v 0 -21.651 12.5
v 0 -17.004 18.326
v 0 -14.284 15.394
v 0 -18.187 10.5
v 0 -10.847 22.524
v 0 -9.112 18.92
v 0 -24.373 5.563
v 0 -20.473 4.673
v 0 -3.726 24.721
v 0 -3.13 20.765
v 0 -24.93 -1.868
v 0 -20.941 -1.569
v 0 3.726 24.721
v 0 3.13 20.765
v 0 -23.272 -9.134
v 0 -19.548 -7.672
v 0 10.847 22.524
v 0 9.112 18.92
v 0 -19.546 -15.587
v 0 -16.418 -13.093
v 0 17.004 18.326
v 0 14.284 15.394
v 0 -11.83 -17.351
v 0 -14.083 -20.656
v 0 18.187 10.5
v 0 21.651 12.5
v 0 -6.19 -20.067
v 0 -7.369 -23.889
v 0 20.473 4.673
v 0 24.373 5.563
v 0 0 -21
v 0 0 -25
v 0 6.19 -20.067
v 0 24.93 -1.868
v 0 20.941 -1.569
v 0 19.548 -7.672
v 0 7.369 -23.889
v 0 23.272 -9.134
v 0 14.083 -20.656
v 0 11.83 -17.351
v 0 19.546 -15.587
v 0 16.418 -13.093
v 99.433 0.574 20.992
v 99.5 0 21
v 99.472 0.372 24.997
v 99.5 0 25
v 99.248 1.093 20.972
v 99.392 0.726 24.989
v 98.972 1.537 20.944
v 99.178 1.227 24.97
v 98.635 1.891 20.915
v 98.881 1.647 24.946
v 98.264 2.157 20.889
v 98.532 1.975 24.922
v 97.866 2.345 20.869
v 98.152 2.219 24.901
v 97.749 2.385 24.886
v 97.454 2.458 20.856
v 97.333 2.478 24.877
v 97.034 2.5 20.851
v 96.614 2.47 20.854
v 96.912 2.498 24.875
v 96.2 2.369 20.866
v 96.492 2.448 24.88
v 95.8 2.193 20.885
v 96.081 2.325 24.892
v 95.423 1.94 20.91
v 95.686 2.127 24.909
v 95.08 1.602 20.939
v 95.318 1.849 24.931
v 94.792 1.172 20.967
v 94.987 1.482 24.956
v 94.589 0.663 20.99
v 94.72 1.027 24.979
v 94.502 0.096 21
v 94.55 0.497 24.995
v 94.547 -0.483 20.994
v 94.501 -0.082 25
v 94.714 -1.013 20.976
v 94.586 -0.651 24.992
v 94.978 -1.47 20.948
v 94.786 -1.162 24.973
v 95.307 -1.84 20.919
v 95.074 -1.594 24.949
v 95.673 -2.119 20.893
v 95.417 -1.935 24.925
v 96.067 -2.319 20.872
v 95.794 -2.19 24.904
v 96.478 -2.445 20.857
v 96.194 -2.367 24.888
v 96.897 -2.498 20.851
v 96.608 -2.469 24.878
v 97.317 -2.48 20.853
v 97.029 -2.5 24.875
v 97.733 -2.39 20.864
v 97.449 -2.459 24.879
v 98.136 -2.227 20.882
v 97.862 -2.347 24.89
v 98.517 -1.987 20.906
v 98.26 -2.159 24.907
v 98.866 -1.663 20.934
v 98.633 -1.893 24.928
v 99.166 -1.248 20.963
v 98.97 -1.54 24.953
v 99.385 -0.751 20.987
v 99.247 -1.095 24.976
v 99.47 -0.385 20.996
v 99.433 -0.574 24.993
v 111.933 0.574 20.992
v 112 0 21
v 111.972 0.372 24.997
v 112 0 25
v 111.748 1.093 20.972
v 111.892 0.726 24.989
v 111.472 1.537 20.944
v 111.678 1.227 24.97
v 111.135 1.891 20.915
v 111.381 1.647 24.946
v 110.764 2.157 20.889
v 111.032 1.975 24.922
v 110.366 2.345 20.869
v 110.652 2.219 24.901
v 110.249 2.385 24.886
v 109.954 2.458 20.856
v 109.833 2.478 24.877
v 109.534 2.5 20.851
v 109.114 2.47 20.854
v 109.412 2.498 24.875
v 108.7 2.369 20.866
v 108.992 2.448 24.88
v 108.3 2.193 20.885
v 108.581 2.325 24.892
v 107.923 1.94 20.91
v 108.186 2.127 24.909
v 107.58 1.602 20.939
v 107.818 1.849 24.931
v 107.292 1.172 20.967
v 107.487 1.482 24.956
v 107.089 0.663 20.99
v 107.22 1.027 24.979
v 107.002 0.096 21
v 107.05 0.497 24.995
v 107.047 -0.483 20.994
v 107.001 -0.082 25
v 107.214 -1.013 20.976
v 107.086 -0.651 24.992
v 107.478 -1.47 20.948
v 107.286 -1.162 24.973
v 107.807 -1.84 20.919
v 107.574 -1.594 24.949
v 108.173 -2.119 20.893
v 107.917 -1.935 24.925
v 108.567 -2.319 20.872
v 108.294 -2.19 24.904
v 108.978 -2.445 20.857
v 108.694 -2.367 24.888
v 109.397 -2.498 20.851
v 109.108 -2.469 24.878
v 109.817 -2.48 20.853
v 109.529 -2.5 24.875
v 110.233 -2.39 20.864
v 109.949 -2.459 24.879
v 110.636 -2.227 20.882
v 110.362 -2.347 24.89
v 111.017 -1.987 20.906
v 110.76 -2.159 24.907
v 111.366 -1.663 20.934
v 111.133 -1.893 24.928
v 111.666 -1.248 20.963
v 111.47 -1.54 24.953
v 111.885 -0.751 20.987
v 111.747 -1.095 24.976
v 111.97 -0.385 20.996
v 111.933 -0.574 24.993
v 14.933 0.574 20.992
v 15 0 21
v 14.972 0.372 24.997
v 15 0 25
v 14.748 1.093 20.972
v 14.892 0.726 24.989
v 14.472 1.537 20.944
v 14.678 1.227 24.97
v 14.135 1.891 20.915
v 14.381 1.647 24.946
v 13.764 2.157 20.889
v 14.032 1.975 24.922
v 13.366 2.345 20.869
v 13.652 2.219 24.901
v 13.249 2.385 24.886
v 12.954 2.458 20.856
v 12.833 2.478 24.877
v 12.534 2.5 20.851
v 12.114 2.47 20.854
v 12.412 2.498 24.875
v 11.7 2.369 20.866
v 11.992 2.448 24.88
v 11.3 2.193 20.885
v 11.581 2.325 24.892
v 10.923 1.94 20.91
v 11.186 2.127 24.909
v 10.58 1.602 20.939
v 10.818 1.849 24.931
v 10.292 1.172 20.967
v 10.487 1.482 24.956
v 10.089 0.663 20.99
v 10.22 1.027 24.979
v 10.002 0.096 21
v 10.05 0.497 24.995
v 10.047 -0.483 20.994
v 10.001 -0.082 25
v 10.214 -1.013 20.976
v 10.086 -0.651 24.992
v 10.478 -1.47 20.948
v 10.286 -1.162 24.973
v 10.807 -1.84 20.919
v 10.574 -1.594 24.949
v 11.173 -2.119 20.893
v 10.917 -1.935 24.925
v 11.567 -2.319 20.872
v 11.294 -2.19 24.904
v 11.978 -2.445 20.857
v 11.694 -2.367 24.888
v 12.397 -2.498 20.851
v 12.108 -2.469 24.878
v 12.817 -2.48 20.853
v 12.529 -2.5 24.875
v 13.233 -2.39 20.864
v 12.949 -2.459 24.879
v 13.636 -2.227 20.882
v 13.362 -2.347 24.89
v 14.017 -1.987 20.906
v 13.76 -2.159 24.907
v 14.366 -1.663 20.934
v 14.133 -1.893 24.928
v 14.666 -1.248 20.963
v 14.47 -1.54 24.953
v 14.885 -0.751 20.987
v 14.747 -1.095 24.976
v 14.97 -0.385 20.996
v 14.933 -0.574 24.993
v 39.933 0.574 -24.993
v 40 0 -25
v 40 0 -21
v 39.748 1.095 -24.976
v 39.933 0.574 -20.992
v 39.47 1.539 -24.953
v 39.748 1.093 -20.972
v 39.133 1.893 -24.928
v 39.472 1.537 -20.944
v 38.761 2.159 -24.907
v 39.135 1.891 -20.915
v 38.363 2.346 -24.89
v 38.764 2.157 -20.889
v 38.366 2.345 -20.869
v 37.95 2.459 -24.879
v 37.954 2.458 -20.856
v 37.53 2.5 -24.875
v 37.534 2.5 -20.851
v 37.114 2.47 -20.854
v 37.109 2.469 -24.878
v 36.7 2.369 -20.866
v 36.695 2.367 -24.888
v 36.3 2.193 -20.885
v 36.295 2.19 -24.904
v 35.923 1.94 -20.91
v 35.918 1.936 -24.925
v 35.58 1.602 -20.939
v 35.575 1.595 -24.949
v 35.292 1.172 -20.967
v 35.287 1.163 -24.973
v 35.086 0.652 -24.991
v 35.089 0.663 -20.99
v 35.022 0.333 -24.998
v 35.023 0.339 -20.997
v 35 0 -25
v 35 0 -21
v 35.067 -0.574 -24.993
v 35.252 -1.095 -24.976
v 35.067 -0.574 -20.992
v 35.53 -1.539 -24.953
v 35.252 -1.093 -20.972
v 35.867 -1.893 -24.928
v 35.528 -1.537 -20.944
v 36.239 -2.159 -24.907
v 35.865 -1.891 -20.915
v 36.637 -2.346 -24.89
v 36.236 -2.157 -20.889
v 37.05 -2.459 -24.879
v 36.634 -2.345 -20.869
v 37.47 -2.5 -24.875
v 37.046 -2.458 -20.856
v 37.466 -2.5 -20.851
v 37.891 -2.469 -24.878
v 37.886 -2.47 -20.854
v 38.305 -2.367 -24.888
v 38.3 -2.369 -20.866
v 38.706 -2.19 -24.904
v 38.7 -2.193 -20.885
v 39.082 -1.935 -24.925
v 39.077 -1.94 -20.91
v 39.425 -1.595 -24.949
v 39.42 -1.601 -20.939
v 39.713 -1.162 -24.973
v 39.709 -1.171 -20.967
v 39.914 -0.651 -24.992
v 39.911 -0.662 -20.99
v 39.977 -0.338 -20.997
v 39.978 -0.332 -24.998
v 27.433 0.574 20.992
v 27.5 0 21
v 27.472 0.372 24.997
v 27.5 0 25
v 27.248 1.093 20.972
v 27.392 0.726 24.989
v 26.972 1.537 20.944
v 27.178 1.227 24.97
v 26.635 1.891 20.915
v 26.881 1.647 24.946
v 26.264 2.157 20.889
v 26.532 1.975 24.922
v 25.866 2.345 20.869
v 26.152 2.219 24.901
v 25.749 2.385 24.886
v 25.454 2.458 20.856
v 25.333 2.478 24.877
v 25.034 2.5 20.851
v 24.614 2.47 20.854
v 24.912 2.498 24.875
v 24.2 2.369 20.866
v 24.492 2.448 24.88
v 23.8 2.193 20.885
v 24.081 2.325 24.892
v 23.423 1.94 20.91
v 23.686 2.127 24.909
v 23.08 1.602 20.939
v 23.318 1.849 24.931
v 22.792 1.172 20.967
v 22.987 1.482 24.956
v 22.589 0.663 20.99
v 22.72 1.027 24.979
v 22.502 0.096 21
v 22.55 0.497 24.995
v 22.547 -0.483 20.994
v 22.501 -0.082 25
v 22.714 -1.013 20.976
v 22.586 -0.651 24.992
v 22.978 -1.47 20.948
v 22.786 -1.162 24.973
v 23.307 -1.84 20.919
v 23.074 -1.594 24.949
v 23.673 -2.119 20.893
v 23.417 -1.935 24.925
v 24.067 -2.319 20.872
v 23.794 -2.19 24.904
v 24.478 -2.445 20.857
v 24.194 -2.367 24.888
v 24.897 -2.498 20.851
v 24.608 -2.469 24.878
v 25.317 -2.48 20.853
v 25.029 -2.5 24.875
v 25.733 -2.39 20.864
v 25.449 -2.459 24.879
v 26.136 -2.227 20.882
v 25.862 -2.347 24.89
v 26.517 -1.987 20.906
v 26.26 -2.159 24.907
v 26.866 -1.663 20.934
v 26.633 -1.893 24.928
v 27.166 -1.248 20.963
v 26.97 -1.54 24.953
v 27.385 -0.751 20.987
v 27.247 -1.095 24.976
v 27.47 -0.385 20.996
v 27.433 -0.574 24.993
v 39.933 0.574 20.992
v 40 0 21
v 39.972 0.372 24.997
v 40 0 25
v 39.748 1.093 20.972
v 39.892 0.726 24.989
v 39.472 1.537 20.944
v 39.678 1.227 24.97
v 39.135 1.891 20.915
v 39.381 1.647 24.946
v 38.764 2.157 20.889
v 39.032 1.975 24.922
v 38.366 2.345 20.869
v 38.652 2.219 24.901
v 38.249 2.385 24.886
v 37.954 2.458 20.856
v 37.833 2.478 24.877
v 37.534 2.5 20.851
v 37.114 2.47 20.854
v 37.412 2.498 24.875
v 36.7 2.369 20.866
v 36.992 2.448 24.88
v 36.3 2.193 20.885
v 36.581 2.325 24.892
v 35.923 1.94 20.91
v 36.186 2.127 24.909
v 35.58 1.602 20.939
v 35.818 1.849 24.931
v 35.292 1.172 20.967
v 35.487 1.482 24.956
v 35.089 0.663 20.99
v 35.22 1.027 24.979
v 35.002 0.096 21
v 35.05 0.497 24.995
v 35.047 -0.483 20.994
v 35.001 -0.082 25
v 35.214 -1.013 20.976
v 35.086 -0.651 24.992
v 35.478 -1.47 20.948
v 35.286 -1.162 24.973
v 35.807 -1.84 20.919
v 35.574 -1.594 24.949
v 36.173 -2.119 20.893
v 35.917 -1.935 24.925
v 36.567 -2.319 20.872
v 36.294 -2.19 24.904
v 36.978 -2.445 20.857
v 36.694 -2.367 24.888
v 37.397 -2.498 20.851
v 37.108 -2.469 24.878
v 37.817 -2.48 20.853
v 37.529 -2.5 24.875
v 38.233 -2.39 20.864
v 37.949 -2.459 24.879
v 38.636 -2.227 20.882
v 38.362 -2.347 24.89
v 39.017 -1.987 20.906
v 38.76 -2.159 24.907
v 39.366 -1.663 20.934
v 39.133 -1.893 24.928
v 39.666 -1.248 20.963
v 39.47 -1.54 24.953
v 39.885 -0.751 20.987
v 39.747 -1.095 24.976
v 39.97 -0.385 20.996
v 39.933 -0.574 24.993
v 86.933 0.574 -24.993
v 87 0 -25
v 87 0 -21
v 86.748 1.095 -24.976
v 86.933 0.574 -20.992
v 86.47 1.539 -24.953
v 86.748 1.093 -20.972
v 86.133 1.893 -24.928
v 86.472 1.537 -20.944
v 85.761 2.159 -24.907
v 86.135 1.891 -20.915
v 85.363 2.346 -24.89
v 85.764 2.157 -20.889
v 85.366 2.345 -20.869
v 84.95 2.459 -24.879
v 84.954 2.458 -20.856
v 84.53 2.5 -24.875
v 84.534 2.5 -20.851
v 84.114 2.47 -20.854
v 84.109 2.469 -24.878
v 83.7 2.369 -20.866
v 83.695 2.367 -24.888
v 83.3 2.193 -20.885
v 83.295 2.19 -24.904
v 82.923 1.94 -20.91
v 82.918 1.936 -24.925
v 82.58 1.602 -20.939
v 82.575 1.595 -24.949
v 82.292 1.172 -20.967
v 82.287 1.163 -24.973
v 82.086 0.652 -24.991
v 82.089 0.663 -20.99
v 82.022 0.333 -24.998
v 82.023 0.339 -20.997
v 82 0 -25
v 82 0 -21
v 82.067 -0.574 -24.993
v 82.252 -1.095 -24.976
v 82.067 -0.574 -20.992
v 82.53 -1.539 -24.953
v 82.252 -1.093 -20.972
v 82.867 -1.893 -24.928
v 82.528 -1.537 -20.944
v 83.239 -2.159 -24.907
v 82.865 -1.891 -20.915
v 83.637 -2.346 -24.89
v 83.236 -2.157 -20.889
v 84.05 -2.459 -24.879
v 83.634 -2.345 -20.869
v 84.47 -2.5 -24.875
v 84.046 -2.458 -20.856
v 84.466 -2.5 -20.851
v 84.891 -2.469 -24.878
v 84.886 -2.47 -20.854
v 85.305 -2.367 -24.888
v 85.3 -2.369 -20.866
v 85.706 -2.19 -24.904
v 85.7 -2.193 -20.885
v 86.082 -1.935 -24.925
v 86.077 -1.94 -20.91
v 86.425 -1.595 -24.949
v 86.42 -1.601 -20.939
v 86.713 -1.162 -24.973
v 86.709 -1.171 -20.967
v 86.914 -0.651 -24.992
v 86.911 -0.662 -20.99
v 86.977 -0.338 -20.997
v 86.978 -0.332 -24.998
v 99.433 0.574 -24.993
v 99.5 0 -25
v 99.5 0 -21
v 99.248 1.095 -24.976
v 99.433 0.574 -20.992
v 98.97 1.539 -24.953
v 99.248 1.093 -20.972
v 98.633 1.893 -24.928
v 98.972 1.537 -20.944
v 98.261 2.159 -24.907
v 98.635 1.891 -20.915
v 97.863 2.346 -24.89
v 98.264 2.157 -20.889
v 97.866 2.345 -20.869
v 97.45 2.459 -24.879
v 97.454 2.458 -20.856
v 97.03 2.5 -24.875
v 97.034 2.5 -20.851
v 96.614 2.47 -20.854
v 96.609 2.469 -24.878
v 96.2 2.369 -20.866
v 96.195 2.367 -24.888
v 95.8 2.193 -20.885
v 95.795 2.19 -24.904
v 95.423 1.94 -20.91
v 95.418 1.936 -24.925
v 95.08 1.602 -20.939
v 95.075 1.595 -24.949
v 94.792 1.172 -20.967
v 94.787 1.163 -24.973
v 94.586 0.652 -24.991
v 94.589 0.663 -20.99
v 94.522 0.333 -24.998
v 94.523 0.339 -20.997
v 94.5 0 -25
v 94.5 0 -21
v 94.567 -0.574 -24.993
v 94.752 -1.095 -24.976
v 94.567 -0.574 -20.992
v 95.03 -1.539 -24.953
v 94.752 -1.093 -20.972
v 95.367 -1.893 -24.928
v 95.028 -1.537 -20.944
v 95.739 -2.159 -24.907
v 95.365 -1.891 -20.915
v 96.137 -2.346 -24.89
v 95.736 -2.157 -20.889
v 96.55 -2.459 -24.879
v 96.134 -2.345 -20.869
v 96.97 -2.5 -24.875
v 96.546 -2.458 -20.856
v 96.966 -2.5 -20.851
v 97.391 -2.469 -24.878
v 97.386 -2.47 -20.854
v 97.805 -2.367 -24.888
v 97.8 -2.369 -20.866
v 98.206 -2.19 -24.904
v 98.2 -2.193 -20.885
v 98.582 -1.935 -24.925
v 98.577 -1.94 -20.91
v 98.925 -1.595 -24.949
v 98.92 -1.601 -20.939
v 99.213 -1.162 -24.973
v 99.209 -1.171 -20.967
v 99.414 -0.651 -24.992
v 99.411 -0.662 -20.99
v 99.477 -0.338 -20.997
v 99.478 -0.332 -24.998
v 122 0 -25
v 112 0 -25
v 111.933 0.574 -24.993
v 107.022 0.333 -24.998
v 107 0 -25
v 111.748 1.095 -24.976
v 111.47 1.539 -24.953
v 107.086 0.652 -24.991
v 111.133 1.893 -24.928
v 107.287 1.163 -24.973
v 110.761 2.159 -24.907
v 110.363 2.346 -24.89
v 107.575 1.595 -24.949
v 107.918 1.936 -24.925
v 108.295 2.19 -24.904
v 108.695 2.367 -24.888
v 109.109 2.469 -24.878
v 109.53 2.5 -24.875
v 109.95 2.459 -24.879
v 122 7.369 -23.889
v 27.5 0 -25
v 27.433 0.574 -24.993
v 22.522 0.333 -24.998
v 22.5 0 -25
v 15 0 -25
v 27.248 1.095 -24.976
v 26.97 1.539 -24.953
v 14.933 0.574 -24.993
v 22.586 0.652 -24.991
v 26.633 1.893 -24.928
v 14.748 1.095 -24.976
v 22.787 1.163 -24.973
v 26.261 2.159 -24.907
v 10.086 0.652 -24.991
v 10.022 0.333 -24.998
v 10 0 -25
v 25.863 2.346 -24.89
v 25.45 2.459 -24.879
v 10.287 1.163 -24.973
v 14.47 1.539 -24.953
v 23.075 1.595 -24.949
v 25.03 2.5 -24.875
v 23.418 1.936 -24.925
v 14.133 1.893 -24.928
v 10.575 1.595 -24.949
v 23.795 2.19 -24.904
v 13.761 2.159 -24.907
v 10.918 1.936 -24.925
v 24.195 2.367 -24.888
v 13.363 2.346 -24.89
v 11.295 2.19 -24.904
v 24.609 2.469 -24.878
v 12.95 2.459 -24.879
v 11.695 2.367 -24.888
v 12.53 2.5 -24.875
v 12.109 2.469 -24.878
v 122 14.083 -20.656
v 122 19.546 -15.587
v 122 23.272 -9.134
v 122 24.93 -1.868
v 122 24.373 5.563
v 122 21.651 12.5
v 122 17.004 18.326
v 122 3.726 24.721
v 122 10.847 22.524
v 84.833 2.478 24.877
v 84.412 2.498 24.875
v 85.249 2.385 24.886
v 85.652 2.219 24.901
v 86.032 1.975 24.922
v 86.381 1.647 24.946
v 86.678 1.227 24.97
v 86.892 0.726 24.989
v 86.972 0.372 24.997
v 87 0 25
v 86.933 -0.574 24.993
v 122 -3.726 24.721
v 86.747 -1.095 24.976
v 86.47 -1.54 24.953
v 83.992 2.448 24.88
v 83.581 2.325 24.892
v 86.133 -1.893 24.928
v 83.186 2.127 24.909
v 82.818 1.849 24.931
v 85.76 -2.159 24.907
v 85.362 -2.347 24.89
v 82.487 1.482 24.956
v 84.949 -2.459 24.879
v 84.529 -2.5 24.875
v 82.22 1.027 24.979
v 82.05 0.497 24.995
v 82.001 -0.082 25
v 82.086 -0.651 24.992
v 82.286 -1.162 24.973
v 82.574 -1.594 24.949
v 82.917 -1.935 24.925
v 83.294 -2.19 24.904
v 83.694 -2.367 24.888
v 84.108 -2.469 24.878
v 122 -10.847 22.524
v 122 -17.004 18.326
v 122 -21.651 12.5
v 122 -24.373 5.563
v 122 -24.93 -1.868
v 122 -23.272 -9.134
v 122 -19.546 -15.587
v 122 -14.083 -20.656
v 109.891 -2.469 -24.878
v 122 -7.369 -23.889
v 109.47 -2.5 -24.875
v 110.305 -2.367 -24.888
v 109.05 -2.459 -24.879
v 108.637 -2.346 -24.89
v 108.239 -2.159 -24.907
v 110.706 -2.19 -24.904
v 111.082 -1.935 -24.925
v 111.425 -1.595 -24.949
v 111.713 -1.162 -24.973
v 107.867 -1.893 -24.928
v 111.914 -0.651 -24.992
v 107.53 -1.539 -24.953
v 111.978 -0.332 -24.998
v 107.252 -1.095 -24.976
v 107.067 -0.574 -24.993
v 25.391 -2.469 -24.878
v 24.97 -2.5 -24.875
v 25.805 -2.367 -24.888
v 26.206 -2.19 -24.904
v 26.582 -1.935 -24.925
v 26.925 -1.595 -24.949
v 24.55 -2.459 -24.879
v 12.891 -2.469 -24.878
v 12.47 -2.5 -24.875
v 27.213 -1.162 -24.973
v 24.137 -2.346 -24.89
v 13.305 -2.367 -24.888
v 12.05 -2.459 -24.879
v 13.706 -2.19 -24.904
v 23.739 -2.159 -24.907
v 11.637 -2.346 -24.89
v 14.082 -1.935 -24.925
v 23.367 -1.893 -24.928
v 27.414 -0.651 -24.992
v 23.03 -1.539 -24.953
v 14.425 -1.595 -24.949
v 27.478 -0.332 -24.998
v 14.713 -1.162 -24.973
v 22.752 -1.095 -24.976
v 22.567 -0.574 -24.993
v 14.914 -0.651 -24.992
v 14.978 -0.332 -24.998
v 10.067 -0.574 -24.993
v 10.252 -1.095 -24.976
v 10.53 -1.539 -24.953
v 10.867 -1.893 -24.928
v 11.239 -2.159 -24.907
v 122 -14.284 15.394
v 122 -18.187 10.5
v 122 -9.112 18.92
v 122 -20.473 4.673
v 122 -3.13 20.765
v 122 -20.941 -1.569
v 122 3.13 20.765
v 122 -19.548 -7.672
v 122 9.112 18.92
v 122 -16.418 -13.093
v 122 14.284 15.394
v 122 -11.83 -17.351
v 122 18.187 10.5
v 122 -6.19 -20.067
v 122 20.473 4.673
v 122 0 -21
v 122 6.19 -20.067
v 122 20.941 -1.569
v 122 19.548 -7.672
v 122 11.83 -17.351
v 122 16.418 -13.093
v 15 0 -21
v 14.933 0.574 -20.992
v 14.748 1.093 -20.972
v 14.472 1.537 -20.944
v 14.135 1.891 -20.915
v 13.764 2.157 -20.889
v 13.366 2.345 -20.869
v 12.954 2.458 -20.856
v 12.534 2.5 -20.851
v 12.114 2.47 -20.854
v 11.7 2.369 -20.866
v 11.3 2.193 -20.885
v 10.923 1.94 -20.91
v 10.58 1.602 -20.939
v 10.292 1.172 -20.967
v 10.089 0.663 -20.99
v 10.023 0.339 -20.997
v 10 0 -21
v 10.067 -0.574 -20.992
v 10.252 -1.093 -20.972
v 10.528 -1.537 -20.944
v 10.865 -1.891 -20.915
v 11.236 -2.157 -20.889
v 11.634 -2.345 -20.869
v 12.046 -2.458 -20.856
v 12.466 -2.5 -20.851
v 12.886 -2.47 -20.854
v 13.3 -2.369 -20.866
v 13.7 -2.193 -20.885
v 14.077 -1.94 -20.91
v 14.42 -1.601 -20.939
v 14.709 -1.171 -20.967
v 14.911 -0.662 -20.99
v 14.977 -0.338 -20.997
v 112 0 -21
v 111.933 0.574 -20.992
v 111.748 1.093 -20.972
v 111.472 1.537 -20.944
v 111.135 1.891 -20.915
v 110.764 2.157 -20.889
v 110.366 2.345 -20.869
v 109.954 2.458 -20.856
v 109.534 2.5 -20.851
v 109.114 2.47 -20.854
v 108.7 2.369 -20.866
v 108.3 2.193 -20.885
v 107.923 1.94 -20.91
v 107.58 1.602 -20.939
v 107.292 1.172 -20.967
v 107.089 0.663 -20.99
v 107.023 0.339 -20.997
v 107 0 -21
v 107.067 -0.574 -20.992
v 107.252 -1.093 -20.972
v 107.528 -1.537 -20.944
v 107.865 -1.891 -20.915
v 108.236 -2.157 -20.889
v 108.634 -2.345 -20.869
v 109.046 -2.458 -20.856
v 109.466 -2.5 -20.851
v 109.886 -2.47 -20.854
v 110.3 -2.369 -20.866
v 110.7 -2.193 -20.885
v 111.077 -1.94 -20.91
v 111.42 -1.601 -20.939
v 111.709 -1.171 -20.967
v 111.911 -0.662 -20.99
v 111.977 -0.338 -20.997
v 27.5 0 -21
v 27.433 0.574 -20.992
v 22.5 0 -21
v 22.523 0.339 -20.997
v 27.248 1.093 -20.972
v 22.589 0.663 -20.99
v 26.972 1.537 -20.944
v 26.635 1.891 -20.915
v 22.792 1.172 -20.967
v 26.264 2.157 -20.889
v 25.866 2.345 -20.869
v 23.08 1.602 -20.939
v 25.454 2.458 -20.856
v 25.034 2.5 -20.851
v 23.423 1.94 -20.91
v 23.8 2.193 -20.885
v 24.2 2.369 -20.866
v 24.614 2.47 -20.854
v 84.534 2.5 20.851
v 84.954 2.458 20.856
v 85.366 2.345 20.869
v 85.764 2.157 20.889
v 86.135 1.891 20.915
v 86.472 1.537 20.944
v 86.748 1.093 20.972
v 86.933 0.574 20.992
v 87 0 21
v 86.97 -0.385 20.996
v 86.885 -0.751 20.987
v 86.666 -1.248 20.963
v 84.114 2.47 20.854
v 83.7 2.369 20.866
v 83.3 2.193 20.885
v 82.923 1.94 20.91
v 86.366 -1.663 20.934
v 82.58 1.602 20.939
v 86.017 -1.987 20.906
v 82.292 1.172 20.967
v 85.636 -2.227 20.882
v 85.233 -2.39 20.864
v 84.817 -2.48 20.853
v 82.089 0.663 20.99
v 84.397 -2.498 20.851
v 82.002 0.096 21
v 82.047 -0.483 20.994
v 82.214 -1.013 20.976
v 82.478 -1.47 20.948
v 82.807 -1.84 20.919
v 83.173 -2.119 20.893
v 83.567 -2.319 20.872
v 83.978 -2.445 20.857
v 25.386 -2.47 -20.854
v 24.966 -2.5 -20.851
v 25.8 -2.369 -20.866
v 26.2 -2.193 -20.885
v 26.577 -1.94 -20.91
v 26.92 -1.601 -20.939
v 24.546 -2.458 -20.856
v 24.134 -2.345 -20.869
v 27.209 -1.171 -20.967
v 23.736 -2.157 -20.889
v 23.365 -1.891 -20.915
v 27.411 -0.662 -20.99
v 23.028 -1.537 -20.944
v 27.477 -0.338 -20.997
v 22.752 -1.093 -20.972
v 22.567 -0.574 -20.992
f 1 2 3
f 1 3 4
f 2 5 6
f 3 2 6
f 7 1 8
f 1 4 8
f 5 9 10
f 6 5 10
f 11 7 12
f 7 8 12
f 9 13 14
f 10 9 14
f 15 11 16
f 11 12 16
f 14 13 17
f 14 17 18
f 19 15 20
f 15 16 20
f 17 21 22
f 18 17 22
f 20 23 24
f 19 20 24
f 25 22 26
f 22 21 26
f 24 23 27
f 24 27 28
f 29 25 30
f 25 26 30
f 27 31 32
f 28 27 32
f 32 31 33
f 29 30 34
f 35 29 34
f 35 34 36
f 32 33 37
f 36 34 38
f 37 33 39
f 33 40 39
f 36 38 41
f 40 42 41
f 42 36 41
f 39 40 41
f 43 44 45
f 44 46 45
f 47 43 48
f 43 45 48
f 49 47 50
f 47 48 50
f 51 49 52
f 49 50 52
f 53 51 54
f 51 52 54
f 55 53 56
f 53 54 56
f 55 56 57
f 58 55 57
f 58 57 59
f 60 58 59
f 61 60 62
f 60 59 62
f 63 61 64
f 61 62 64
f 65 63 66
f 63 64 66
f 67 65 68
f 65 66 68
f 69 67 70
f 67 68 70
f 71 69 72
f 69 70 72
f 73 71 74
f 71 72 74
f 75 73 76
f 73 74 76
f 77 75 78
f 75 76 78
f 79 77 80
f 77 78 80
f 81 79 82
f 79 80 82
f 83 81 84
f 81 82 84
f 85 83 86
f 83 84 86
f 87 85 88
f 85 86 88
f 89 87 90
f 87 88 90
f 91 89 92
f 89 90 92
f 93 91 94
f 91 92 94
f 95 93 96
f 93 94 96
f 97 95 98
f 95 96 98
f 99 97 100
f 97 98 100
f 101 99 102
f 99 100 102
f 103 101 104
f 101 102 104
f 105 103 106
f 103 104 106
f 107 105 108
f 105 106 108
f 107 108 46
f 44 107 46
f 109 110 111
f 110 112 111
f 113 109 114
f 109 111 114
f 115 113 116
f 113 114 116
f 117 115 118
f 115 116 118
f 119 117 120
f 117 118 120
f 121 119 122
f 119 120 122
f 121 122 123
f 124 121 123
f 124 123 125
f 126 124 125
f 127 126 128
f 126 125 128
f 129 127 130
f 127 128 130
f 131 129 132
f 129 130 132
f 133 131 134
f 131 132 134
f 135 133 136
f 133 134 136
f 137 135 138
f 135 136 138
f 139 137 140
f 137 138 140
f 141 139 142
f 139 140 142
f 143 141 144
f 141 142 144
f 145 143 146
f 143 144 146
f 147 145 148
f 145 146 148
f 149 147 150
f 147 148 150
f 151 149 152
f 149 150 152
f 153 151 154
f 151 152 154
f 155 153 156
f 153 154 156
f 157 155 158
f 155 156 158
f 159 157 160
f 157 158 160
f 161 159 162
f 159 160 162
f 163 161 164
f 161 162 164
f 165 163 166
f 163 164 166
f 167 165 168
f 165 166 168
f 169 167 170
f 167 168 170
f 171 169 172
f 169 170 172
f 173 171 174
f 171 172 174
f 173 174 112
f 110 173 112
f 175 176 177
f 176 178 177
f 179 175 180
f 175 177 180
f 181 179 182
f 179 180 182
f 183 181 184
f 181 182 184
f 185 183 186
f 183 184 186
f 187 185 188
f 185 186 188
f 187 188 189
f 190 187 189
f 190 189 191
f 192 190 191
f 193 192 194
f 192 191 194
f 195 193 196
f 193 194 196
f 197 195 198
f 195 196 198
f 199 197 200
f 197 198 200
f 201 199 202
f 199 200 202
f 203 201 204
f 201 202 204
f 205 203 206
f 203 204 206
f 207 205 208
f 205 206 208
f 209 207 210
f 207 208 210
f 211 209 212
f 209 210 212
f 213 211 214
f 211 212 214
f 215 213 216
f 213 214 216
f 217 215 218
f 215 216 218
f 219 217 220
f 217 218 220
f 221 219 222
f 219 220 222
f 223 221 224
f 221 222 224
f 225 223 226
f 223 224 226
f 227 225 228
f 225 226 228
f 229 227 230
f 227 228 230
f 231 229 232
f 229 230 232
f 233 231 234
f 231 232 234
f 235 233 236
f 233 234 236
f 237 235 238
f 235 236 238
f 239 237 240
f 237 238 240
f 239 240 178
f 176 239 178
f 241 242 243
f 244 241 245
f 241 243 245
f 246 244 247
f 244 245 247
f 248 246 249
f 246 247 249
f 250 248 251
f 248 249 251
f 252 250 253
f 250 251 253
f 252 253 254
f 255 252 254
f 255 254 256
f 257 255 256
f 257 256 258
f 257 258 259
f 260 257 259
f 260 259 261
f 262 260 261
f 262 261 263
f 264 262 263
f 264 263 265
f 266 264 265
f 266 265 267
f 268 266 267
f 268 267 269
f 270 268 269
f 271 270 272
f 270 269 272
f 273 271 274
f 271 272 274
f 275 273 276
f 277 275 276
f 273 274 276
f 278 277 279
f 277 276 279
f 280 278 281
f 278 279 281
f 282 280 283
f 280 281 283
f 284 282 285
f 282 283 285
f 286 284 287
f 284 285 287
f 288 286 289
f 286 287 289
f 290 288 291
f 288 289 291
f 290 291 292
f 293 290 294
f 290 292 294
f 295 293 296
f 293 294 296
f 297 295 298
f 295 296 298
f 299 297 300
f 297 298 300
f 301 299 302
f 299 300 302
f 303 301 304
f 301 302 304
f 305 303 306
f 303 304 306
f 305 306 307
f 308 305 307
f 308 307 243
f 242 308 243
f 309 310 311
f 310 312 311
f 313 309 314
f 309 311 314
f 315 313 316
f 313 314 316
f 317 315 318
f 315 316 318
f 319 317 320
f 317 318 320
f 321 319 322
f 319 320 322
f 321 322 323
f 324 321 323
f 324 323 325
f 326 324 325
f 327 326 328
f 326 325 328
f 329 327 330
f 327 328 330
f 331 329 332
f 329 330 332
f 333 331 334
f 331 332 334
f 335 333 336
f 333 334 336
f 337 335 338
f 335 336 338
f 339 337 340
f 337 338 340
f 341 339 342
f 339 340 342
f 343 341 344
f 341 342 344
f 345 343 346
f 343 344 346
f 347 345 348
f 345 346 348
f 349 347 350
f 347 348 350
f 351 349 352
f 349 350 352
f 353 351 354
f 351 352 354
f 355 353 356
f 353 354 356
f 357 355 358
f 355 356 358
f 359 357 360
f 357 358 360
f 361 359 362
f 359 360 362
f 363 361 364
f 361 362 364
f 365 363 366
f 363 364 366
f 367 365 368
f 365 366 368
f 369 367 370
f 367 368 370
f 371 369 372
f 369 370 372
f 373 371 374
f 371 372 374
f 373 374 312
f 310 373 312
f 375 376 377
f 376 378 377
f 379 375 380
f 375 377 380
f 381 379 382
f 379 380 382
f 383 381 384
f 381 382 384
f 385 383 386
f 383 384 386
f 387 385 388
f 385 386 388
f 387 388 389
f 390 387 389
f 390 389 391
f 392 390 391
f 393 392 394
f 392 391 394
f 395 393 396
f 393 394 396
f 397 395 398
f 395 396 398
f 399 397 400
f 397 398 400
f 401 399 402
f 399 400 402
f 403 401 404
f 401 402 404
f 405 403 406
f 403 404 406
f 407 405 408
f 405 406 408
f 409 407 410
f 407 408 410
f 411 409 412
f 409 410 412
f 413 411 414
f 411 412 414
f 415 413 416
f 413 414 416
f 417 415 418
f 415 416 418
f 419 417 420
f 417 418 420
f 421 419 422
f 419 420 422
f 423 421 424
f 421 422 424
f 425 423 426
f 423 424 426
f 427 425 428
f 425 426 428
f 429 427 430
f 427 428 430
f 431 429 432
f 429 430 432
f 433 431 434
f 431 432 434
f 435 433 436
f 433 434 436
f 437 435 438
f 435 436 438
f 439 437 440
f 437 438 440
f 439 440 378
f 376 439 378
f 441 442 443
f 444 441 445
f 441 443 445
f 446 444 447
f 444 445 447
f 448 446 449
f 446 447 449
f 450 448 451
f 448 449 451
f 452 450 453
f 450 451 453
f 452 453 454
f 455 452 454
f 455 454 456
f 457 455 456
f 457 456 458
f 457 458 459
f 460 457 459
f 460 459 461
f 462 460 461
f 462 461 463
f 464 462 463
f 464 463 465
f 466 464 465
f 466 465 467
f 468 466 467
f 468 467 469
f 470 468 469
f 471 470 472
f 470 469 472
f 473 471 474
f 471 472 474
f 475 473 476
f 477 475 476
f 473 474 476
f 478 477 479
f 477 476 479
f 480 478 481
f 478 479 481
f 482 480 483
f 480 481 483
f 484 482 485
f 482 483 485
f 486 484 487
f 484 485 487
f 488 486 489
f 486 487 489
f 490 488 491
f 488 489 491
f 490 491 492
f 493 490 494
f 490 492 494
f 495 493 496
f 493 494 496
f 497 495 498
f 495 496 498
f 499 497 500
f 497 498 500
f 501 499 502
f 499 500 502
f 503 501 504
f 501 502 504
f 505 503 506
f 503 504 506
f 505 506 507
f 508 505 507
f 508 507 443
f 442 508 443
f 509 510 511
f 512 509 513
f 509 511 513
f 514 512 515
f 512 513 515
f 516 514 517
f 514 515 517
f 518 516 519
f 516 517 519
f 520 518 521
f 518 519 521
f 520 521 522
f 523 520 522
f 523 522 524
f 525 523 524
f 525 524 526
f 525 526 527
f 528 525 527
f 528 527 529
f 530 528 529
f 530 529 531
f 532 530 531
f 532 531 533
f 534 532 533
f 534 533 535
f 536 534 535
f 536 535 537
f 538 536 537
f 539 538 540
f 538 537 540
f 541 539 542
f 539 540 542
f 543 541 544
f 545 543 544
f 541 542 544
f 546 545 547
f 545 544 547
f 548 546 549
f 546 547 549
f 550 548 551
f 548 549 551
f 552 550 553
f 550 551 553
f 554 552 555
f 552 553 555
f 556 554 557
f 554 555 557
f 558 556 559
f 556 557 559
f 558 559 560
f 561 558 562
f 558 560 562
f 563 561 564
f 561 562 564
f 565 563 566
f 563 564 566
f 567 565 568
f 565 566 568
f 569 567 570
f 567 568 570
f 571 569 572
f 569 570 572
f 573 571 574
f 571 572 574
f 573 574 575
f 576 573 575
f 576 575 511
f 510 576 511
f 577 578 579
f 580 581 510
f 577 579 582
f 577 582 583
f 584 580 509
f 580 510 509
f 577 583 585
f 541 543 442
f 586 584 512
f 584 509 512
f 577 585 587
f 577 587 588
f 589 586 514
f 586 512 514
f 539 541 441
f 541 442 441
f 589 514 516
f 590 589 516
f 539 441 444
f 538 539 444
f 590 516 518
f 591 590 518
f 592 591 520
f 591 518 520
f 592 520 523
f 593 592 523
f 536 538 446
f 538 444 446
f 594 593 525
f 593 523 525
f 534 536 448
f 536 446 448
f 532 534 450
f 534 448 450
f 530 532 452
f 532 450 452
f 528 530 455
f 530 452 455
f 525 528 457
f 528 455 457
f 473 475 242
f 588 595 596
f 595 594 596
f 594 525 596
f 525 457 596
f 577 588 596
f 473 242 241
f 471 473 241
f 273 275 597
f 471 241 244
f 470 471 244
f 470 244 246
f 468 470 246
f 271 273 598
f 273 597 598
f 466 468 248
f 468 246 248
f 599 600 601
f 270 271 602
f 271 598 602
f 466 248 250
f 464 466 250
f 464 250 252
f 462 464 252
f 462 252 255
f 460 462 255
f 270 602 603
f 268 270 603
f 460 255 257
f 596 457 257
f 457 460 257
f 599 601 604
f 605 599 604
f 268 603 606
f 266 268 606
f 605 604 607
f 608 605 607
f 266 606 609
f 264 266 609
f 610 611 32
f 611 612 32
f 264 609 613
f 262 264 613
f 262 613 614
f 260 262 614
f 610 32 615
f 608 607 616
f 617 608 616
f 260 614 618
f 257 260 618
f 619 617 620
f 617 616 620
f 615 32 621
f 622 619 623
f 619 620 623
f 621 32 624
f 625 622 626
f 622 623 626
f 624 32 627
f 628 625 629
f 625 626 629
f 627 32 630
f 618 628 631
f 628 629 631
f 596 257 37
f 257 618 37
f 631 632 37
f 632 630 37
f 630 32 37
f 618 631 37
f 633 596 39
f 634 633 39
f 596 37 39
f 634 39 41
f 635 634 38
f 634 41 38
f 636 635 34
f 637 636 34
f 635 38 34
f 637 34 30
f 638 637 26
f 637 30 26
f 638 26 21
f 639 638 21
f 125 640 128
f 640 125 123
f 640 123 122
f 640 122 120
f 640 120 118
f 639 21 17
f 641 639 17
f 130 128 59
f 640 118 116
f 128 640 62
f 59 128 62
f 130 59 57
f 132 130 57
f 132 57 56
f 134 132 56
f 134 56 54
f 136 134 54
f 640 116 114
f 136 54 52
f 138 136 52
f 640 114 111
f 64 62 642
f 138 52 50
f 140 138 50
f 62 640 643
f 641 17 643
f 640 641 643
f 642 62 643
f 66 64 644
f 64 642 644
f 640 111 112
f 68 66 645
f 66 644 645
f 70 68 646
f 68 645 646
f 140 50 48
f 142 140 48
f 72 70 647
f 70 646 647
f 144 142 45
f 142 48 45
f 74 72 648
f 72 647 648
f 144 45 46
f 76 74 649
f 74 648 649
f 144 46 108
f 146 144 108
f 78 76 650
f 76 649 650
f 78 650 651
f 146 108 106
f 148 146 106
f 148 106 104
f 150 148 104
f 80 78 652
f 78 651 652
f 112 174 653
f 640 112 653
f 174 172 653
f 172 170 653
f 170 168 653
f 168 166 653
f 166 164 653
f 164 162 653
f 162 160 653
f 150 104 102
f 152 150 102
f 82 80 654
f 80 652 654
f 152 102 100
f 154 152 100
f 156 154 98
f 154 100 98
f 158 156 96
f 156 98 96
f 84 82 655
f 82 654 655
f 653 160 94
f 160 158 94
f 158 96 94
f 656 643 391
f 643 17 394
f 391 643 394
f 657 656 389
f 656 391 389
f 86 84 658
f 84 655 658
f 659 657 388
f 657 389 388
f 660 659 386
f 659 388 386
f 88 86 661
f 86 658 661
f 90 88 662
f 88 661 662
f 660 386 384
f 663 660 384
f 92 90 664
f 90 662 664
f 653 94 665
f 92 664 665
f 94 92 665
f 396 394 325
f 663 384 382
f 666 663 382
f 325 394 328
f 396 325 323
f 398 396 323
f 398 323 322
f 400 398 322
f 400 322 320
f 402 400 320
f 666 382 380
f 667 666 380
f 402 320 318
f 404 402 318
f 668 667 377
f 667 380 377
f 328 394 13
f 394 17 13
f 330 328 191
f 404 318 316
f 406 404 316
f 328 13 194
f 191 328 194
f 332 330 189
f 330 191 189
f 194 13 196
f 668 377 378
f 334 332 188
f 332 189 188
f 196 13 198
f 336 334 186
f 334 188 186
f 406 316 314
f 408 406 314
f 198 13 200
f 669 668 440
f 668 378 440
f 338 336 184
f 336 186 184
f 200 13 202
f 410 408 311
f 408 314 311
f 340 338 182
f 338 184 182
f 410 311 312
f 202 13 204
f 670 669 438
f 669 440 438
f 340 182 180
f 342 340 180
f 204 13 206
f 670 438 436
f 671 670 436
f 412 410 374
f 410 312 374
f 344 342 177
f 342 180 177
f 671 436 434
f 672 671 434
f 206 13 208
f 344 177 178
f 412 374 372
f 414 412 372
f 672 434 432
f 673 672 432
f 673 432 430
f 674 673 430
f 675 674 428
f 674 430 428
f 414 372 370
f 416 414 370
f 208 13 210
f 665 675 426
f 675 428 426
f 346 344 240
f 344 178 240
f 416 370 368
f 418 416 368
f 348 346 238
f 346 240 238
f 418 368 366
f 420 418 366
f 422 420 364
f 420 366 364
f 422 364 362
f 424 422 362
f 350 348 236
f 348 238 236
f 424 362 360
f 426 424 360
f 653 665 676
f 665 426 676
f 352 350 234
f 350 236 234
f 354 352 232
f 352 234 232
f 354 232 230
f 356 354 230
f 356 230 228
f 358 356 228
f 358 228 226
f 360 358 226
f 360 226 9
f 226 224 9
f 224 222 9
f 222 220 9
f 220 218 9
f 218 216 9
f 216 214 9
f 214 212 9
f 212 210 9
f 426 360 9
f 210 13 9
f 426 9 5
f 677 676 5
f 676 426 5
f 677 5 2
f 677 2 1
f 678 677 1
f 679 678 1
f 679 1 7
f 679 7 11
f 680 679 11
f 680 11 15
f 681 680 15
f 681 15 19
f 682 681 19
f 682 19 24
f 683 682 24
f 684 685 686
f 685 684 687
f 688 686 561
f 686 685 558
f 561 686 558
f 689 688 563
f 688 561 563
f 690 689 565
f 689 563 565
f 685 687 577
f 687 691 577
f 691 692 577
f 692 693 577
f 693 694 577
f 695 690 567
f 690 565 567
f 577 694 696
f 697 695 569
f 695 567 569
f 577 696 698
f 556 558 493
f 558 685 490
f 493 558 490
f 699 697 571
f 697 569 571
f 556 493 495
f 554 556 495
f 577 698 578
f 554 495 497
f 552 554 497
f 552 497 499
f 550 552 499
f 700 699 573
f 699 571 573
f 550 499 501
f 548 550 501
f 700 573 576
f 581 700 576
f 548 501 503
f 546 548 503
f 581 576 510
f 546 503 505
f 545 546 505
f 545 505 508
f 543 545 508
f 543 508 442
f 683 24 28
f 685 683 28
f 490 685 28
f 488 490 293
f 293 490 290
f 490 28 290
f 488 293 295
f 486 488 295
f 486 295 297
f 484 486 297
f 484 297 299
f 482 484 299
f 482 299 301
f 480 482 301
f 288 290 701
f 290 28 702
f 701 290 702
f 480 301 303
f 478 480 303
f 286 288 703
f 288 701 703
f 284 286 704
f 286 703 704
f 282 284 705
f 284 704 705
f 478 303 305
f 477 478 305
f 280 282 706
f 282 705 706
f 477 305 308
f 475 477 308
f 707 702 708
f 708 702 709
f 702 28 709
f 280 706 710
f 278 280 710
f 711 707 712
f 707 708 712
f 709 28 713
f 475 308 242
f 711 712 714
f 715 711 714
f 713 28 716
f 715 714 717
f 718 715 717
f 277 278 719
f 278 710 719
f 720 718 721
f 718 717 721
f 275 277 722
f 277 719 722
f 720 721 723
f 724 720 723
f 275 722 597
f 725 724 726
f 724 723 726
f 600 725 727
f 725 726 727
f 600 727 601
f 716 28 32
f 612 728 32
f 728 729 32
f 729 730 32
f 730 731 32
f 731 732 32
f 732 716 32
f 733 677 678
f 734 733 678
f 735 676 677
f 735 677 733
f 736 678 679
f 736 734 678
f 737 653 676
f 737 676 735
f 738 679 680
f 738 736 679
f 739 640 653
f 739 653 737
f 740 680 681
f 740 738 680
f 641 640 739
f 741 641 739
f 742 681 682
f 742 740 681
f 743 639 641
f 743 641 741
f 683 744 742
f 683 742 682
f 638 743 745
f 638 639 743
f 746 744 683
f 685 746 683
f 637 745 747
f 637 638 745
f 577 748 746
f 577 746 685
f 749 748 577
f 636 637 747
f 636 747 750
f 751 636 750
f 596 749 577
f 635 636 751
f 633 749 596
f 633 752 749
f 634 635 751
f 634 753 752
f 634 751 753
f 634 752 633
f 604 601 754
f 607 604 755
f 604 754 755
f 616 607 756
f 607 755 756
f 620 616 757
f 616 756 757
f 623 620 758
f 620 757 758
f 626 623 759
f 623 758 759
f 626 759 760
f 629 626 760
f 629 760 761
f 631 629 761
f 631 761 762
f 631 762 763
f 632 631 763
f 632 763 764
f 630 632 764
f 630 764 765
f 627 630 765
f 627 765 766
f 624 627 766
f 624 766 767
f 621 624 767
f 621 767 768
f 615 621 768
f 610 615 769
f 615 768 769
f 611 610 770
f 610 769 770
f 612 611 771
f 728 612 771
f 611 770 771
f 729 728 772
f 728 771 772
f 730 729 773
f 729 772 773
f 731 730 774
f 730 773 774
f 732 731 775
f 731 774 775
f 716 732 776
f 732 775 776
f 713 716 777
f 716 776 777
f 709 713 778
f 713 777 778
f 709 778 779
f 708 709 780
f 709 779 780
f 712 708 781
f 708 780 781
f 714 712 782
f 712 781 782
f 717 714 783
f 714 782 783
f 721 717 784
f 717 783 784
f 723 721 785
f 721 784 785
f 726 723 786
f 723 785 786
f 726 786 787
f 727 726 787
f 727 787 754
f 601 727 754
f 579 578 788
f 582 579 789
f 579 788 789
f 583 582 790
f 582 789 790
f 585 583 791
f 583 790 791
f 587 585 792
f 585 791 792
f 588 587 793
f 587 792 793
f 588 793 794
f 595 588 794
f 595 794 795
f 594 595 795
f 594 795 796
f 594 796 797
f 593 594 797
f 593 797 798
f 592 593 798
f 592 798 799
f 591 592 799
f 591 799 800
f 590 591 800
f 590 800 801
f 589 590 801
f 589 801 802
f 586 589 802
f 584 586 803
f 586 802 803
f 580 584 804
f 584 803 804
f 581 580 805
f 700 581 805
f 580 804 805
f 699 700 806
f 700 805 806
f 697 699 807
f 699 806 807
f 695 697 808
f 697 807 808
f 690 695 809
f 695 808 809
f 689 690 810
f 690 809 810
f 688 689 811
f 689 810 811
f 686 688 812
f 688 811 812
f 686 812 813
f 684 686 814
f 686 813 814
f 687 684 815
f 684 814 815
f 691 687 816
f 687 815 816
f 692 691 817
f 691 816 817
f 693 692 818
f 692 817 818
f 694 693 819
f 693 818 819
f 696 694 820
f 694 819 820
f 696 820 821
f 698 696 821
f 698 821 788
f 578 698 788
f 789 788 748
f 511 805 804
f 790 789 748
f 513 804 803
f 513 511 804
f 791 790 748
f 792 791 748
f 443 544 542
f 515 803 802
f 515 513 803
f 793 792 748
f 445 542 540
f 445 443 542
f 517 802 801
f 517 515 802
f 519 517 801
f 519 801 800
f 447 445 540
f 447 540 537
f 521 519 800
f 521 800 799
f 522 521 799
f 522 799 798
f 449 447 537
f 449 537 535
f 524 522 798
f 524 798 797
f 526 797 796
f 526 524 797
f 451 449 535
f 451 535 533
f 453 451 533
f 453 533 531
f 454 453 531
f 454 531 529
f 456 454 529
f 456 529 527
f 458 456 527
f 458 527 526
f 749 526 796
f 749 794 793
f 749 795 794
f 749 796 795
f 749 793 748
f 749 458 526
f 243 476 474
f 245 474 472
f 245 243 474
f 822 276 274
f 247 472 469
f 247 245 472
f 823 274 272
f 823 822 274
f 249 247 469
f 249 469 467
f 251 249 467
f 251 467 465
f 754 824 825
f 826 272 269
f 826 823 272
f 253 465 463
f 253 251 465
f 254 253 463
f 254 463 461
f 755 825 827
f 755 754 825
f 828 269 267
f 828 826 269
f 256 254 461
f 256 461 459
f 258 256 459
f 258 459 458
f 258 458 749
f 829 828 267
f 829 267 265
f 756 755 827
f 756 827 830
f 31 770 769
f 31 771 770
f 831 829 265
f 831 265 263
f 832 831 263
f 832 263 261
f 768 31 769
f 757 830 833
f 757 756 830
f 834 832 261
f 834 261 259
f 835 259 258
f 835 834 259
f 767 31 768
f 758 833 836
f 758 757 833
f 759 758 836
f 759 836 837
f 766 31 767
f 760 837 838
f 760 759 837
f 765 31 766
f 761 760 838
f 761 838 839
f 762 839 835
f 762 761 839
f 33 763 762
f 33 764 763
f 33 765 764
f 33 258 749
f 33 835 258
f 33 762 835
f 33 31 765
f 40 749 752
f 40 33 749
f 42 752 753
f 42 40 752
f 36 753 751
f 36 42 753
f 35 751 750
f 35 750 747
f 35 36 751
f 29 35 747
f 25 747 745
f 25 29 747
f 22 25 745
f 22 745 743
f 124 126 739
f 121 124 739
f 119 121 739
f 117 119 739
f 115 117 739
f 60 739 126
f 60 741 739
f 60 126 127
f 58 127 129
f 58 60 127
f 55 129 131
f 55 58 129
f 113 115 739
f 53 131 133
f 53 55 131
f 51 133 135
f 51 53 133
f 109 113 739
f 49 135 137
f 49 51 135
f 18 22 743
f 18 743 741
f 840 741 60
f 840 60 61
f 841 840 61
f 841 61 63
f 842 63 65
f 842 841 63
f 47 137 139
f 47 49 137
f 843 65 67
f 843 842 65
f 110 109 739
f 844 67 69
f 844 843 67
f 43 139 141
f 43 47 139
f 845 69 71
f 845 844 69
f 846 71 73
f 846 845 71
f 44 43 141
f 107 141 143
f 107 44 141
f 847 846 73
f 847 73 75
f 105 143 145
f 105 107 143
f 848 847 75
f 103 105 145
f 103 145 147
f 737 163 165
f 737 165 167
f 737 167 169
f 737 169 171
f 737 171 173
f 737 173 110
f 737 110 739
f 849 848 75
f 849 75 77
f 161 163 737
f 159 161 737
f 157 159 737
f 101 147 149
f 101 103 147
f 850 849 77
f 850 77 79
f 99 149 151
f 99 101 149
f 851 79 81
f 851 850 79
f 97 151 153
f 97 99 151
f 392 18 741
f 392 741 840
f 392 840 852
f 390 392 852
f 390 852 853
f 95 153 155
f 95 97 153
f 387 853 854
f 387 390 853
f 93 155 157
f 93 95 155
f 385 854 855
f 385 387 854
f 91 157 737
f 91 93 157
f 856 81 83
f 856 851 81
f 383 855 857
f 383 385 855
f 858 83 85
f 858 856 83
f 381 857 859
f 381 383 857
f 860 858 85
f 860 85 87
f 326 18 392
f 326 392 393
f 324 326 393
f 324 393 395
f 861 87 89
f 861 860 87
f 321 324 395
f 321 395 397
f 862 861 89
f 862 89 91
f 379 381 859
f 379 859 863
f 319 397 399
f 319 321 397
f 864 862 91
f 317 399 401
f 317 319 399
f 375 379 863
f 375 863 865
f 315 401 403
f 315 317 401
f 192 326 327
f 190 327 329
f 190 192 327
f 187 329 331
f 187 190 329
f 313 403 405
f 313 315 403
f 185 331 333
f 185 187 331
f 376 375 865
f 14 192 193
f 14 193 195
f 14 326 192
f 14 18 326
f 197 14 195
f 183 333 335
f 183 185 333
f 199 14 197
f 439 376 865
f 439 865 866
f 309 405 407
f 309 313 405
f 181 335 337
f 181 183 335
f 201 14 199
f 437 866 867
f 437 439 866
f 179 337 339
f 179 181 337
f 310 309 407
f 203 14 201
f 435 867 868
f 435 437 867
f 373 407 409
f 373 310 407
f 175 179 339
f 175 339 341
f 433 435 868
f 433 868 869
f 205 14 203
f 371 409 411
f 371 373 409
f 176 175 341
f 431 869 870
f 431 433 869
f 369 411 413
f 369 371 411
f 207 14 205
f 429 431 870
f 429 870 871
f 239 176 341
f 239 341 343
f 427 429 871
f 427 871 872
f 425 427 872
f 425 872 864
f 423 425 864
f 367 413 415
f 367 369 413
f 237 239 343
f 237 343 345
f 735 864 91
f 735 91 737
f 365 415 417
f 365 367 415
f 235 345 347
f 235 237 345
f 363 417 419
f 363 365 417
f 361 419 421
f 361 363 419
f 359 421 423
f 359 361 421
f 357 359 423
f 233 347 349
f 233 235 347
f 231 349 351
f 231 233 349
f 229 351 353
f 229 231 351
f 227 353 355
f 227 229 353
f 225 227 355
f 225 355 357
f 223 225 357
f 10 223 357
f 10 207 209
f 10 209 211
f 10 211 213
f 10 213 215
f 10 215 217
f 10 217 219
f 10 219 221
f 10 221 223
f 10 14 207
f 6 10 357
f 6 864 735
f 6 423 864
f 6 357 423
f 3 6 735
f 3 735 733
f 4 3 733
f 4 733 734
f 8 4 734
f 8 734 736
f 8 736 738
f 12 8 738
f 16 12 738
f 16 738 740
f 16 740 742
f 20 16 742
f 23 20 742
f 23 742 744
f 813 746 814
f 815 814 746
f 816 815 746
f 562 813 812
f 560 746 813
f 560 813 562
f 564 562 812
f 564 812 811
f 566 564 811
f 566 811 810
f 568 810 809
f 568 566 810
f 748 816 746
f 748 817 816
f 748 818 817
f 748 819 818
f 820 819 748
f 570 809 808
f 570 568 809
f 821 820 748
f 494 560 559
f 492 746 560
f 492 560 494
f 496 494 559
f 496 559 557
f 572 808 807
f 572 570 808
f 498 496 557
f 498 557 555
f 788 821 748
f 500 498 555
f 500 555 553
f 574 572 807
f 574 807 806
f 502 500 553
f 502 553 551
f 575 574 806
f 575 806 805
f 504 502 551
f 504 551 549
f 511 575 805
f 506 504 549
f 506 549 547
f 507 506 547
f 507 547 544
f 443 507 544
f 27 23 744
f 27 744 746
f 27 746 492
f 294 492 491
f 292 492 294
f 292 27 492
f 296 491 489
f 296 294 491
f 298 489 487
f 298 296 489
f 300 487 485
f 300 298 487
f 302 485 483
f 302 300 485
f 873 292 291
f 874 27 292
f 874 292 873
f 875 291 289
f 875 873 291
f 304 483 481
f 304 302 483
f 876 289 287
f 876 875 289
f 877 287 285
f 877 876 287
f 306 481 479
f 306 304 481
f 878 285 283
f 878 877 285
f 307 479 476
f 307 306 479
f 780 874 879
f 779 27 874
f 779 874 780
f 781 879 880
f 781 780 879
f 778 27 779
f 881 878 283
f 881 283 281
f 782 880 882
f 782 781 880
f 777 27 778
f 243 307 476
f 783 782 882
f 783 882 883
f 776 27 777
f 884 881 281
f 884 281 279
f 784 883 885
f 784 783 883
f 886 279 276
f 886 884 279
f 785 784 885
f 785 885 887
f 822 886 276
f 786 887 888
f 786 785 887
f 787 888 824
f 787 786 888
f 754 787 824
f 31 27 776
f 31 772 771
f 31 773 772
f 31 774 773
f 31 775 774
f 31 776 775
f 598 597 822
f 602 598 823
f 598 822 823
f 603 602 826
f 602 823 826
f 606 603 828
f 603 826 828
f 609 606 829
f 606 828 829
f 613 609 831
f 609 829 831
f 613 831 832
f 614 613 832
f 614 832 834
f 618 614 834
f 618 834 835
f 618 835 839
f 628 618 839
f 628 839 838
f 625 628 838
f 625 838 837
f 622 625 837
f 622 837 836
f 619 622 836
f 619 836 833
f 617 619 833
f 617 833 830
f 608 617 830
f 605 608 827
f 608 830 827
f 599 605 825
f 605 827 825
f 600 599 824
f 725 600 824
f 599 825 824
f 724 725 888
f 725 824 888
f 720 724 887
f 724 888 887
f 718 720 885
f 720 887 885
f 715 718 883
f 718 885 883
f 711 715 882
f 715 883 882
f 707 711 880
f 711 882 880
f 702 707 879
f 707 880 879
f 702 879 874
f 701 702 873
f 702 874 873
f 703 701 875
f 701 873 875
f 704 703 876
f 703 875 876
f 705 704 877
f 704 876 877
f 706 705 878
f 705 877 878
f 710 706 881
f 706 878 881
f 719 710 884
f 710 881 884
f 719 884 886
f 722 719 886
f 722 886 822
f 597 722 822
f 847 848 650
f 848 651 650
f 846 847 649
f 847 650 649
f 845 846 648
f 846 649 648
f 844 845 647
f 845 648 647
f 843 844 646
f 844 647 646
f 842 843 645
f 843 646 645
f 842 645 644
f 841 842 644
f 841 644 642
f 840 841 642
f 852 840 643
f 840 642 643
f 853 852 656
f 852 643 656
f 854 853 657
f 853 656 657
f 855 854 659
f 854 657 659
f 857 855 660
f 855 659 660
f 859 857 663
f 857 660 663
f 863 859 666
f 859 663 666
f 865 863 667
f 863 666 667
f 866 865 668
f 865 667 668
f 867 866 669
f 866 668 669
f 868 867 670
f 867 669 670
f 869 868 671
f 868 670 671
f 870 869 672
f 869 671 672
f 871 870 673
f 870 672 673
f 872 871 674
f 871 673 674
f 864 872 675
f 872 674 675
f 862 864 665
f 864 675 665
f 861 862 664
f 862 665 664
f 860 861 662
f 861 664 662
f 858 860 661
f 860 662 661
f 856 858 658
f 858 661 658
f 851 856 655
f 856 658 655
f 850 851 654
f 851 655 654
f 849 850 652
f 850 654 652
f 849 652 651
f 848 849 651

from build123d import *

# Parameters (mm, degrees)
SKETCH_2_R               = 25
SKETCH_2_R_2             = 21
EXTRUDE_2_DEPTH          = 122
SKETCH_4_R               = 2.5
CUT_EXTRUDE_2_DEPTH      = 10
CUT_EXTRUDE_2_DEPTH_BACK = 51


with BuildPart() as part:
    # Эскиз2 → Бобышка-Вытянуть2 (new body)
    with BuildSketch(Plane(origin=(0, 0, 0), x_dir=(0, 0, -1), z_dir=(1, 0, 0))):
        Circle(SKETCH_2_R)
        Circle(SKETCH_2_R_2, mode=Mode.SUBTRACT)
    extrude(amount=EXTRUDE_2_DEPTH)

    # Эскиз4 → Вырез-Вытянуть2 (cut, two sides)
    with BuildSketch(Plane.XY.offset(25)) as cut_extrude_2_sk:
        with Locations((12.5, 0)):
            Circle(SKETCH_4_R)
        with Locations((109.5, 0)):
            Circle(SKETCH_4_R)
        with Locations((25, 0)):
            Circle(SKETCH_4_R)
        with Locations((37.5, 0)):
            Circle(SKETCH_4_R)
        with Locations((97, 0)):
            Circle(SKETCH_4_R)
        with Locations((84.5, 0)):
            Circle(SKETCH_4_R)
    extrude(amount=CUT_EXTRUDE_2_DEPTH, mode=Mode.SUBTRACT)
    extrude(cut_extrude_2_sk.sketch, amount=-CUT_EXTRUDE_2_DEPTH_BACK, mode=Mode.SUBTRACT)


solid = part.part
